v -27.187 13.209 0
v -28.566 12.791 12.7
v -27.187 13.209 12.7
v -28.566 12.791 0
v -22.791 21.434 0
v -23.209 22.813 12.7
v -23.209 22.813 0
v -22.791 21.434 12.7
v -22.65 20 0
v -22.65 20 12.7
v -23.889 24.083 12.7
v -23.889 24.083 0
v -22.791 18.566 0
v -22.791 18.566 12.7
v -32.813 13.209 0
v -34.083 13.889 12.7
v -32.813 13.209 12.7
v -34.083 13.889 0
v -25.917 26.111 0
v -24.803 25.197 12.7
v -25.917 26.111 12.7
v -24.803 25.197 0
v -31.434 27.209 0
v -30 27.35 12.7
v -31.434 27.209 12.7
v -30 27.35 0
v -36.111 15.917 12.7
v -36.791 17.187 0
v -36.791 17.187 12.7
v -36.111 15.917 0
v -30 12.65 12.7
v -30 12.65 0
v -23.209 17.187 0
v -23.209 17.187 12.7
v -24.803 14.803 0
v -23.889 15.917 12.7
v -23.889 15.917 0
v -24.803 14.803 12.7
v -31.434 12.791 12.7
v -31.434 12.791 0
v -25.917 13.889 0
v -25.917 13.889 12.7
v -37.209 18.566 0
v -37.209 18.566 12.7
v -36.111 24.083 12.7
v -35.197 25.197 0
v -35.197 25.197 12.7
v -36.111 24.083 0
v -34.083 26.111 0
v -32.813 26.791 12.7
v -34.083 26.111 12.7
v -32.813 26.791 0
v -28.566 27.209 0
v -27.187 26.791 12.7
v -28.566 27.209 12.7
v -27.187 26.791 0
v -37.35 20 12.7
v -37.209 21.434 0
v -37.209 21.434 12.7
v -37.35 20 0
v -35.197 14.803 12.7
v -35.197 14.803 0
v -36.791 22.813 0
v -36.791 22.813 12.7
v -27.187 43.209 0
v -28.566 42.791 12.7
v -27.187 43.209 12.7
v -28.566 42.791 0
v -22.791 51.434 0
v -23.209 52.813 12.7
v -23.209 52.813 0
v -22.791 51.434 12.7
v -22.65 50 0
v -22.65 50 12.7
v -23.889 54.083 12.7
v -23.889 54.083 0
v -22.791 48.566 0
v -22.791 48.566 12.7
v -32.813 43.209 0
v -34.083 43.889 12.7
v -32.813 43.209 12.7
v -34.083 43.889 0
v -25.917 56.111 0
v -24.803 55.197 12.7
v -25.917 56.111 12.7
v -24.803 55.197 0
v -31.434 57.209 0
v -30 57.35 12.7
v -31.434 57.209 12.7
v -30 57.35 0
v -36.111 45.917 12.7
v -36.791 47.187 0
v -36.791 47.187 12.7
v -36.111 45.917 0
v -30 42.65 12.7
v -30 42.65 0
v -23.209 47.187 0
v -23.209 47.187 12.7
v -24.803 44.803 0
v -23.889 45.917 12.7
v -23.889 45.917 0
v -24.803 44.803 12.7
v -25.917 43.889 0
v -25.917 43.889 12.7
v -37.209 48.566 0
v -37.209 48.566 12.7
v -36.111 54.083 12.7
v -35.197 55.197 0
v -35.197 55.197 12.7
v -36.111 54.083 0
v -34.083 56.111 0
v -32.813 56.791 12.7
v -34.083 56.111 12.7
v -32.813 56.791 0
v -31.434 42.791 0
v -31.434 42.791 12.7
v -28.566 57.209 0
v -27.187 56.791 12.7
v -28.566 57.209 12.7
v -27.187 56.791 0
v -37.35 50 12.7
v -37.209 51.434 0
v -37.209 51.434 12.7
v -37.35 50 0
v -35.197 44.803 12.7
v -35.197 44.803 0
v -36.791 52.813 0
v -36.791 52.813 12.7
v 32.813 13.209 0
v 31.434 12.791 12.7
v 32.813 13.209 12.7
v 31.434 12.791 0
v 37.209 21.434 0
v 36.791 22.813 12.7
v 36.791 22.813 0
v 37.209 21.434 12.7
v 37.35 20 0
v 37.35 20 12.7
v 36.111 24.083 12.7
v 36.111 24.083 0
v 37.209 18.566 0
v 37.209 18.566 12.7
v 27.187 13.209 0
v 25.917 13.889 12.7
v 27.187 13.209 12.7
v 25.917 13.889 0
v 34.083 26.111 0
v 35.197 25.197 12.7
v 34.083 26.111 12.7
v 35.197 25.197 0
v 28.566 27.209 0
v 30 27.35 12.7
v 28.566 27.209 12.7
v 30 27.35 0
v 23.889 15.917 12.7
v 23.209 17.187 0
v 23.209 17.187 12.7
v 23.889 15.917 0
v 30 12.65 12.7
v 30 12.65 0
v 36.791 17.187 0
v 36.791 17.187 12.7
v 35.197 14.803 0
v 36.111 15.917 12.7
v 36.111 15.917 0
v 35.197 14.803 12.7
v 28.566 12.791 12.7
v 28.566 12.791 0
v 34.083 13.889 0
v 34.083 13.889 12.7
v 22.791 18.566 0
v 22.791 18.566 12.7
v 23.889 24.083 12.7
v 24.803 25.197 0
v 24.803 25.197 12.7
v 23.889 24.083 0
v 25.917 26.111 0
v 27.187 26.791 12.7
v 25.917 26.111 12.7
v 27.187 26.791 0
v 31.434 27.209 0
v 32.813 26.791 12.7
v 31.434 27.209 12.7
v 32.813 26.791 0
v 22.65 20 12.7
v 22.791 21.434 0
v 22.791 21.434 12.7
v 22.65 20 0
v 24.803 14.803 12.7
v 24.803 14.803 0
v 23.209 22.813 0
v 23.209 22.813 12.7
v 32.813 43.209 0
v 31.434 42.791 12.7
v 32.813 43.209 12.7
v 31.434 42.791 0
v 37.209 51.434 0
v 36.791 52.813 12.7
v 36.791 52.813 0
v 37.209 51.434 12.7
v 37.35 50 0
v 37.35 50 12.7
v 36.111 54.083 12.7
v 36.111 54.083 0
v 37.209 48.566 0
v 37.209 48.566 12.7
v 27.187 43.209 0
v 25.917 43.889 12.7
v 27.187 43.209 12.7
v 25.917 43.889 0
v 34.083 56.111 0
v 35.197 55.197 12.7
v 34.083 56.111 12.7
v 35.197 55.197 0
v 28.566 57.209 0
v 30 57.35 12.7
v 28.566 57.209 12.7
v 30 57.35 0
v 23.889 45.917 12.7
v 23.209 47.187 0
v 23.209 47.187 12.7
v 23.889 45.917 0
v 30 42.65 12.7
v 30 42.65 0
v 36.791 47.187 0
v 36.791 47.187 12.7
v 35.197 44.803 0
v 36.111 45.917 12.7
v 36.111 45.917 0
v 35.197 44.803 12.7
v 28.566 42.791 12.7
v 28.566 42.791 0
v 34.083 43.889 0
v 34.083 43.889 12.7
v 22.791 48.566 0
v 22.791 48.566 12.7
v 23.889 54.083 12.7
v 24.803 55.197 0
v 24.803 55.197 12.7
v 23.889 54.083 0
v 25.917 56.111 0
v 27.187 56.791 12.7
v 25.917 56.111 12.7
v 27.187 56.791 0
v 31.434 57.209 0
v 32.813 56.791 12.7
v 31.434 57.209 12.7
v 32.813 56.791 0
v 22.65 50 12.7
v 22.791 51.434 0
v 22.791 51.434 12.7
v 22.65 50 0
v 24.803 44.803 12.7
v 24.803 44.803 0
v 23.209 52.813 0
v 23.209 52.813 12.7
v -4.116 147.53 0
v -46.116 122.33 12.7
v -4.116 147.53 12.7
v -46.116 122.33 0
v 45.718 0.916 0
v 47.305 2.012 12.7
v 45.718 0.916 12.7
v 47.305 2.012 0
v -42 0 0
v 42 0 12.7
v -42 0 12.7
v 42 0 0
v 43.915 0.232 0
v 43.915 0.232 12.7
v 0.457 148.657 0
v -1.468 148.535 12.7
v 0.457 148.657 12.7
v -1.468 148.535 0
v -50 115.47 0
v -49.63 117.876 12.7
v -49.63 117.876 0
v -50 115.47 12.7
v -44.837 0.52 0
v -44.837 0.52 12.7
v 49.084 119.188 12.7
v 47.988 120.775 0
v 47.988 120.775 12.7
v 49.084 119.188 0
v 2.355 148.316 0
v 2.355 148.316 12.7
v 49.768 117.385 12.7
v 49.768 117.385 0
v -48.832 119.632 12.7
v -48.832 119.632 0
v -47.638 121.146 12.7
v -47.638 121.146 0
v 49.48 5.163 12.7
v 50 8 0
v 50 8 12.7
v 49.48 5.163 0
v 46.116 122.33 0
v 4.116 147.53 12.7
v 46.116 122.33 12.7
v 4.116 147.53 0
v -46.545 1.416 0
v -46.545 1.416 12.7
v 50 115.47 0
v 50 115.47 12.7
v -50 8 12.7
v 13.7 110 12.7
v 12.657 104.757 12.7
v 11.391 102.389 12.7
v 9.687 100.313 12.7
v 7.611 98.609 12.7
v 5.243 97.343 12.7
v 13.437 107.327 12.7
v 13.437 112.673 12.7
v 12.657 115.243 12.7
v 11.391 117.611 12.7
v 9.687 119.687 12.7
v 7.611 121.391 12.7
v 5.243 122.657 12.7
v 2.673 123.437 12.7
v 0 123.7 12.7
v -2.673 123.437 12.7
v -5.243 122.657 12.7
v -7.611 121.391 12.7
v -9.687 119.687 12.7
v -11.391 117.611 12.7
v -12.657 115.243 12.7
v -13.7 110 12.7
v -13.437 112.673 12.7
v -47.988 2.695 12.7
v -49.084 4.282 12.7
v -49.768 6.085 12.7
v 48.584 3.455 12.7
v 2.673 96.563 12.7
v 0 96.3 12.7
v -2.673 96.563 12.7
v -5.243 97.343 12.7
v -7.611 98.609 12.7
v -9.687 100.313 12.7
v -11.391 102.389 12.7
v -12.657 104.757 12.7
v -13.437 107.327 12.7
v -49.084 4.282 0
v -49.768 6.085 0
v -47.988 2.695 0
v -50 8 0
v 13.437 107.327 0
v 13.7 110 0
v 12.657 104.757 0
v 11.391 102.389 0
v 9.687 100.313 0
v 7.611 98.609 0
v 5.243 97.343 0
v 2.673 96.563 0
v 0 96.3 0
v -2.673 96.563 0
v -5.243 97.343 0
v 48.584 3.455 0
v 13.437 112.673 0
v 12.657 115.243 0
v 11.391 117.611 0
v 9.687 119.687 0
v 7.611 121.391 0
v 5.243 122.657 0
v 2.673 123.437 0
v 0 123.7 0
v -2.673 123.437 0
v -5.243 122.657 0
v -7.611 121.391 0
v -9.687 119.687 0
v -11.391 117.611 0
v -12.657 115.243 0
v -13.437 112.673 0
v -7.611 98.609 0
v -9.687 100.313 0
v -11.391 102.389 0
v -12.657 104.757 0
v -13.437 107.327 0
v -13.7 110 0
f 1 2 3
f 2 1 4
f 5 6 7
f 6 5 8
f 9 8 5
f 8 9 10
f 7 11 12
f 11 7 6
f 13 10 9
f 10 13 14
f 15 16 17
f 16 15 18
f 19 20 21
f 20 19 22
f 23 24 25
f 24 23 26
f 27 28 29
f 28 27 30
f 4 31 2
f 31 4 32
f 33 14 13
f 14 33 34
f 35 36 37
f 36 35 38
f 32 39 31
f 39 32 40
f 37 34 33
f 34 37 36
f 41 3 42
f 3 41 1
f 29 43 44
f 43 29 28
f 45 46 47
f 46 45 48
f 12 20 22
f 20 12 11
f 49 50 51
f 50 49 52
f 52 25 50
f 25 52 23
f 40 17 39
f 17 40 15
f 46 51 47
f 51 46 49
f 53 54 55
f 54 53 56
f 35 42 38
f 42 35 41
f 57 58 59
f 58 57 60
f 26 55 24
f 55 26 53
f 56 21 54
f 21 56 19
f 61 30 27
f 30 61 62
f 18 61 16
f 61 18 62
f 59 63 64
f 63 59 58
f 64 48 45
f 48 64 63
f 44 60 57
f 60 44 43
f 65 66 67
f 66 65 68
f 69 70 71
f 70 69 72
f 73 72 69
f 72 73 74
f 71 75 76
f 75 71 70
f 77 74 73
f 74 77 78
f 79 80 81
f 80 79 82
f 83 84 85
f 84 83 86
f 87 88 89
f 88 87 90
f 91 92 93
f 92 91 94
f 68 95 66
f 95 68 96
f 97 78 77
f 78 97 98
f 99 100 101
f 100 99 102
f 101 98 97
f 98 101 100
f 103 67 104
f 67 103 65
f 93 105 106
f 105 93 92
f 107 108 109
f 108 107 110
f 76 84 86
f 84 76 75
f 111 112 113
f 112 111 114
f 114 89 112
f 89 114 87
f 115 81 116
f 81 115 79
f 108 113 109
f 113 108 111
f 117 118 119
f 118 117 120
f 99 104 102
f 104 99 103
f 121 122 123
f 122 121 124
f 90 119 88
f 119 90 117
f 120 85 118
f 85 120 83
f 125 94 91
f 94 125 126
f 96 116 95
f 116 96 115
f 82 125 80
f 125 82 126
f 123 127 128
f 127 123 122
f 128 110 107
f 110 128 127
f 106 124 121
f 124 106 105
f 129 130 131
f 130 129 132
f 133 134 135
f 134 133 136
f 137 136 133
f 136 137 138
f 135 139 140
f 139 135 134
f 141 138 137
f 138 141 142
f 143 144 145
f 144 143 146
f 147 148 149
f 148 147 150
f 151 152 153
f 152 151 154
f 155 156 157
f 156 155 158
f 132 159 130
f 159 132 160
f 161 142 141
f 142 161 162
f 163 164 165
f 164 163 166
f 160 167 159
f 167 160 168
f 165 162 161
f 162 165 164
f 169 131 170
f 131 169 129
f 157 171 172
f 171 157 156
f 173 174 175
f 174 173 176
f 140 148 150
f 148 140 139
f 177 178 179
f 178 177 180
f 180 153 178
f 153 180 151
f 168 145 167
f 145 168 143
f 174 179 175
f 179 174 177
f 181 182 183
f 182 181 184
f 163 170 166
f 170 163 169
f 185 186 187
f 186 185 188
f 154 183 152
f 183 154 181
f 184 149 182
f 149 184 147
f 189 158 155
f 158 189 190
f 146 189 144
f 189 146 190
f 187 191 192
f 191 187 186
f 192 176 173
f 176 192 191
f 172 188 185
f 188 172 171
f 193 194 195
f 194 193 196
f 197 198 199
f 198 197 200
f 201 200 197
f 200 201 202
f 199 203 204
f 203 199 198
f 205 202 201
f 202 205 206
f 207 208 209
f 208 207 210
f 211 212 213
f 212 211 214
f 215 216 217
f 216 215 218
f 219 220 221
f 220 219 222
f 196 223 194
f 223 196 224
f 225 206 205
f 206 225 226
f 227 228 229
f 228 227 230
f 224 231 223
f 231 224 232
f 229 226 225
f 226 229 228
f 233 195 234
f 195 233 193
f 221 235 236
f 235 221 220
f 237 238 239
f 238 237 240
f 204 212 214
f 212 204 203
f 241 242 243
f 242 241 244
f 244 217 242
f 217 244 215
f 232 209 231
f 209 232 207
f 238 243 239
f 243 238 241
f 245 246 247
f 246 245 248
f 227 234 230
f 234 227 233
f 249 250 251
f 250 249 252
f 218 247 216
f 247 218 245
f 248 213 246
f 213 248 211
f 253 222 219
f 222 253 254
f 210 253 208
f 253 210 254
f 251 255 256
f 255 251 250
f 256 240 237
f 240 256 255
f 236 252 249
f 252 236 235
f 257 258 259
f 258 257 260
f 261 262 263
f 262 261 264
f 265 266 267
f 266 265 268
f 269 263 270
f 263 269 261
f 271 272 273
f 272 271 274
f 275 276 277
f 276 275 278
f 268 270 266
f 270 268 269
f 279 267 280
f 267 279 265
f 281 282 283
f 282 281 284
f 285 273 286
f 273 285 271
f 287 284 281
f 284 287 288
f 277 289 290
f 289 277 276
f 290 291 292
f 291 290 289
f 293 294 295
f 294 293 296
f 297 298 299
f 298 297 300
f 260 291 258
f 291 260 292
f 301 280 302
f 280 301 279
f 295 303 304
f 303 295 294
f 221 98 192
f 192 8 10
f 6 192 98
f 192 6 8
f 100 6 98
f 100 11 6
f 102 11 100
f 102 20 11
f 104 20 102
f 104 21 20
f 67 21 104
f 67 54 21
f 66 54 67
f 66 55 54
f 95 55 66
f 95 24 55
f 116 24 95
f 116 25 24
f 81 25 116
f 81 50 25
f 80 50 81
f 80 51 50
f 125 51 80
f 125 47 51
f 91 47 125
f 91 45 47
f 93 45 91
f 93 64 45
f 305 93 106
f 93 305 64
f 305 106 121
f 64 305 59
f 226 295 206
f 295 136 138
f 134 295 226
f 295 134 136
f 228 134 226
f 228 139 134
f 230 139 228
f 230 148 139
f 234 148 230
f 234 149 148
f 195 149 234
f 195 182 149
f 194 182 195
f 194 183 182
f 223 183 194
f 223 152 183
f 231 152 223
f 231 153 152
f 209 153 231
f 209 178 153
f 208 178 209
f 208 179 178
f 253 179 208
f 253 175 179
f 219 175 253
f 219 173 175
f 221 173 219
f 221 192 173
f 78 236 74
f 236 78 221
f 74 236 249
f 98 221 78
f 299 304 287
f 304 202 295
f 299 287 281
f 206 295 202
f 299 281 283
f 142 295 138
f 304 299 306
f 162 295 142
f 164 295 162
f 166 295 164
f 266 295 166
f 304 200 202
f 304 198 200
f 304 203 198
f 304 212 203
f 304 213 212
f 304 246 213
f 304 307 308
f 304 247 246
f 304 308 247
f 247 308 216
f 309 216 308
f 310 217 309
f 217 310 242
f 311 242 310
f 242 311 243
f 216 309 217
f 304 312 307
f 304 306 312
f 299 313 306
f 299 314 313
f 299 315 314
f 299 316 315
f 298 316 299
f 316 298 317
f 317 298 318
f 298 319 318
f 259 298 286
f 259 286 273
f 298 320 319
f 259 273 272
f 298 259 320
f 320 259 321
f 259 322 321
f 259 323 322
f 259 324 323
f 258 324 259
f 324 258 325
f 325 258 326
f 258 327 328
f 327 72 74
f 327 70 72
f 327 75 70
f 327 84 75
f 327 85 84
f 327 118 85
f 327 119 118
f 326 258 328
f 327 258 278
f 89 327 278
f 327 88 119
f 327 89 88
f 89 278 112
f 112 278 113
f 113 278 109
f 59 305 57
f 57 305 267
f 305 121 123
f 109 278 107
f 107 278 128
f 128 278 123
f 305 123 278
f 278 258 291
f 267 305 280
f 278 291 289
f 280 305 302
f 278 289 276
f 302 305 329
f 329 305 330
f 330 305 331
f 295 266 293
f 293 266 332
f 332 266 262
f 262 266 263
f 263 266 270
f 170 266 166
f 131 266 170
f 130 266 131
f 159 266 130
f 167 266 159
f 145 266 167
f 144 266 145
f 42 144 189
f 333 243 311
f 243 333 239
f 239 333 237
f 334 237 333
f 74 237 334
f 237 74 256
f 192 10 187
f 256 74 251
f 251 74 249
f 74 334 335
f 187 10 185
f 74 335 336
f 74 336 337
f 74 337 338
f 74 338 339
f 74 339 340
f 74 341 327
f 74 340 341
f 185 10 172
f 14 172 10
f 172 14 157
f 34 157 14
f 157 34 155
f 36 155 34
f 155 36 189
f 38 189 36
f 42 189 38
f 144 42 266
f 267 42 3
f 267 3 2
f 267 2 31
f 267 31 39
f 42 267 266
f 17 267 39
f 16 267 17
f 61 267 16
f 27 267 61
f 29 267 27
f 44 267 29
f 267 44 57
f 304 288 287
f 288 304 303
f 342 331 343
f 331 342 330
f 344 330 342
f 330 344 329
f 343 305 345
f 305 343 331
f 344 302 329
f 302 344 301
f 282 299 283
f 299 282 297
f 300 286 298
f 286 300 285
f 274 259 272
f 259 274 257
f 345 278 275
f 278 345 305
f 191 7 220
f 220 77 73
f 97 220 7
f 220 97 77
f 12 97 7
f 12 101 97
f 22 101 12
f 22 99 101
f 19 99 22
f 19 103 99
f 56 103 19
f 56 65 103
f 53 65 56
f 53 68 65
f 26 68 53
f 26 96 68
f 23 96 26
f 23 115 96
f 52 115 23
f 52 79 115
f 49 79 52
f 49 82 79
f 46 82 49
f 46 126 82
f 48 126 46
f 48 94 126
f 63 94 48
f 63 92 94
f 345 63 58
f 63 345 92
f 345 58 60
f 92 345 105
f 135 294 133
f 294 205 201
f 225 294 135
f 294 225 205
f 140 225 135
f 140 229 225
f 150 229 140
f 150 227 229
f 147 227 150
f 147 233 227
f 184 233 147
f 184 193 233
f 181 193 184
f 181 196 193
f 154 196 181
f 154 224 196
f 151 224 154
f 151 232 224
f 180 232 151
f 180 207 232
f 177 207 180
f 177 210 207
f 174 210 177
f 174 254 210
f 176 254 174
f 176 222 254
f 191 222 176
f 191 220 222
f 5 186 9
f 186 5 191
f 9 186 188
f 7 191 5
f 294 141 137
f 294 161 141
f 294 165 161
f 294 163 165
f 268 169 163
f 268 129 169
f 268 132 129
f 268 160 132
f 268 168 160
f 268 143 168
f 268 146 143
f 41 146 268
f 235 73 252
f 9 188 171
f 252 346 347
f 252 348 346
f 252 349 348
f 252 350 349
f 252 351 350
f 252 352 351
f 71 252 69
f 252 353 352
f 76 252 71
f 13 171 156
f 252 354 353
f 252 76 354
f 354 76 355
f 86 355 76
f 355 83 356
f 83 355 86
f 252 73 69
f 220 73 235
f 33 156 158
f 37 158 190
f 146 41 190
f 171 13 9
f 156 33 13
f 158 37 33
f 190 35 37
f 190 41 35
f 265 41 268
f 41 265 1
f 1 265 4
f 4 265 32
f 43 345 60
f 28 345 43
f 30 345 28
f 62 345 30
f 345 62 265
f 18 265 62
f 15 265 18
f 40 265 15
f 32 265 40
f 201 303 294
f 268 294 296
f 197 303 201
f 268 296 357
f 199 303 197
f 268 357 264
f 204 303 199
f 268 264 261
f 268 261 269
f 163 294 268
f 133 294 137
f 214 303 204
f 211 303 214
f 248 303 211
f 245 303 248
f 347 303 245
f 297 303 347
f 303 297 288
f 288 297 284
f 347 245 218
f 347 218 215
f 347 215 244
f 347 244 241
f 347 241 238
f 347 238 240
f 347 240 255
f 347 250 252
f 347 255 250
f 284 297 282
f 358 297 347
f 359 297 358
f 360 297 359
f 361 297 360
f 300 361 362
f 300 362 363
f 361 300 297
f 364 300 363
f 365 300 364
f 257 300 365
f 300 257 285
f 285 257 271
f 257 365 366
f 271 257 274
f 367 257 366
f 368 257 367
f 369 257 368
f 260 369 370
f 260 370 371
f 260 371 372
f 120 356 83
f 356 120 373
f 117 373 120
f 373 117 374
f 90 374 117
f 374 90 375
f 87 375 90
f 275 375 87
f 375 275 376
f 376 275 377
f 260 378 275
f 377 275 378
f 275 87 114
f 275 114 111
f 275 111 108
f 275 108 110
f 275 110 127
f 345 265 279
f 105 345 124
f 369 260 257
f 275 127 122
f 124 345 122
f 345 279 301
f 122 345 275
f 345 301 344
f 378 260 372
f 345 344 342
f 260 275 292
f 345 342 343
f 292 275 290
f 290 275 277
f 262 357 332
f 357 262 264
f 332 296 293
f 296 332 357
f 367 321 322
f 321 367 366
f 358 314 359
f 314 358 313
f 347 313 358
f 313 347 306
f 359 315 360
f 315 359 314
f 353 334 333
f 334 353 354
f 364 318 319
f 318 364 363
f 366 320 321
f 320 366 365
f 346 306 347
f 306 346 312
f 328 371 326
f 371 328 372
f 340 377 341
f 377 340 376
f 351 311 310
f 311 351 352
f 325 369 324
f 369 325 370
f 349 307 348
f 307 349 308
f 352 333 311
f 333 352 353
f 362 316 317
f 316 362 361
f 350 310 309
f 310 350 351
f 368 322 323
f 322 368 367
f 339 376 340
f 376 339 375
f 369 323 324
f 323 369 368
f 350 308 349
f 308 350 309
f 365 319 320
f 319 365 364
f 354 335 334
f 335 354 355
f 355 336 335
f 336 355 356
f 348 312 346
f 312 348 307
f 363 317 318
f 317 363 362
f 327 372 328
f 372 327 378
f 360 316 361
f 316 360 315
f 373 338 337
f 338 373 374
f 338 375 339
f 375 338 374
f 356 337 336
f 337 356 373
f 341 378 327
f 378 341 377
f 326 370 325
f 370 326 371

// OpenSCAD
// cylinder_lug.scad
// Hydraulic cylinder mounting lug for LifeTrac v25
// CNC cut from 1/2" plate steel with center pivot hole

include <../lifetrac_v25_params.scad>

module cylinder_lug() {
    lug_width = 100;
    lug_height = 150;
    
    difference() {
        // Main lug plate with rounded top
        linear_extrude(height=PLATE_1_2_INCH)
        offset(r=8) offset(r=-8)  // Rounded corners
        polygon([
            [-lug_width/2, 0],
            [lug_width/2, 0],
            [lug_width/2, lug_height - 30],
            [0, lug_height],
            [-lug_width/2, lug_height - 30]
        ]);
        
        // Center pivot hole for cylinder pin
        translate([0, lug_height - 40, PLATE_1_2_INCH/2])
        cylinder(d=BOLT_DIA_1 + 2, h=PLATE_1_2_INCH+4, center=true, $fn=32);
        
        // Base mounting holes (4 holes)
        for (x = [-lug_width/2 + 20, lug_width/2 - 20]) {
            for (y = [20, 50]) {
                translate([x, y, PLATE_1_2_INCH/2])
                cylinder(d=BOLT_DIA_1_2 + 2, h=PLATE_1_2_INCH+4, center=true, $fn=32);
            }
        }
    }
}

// Render the part for preview/export
if ($preview || len(search("cylinder_lug.scad", parent_modules())) == 0) {
    cylinder_lug();
}
